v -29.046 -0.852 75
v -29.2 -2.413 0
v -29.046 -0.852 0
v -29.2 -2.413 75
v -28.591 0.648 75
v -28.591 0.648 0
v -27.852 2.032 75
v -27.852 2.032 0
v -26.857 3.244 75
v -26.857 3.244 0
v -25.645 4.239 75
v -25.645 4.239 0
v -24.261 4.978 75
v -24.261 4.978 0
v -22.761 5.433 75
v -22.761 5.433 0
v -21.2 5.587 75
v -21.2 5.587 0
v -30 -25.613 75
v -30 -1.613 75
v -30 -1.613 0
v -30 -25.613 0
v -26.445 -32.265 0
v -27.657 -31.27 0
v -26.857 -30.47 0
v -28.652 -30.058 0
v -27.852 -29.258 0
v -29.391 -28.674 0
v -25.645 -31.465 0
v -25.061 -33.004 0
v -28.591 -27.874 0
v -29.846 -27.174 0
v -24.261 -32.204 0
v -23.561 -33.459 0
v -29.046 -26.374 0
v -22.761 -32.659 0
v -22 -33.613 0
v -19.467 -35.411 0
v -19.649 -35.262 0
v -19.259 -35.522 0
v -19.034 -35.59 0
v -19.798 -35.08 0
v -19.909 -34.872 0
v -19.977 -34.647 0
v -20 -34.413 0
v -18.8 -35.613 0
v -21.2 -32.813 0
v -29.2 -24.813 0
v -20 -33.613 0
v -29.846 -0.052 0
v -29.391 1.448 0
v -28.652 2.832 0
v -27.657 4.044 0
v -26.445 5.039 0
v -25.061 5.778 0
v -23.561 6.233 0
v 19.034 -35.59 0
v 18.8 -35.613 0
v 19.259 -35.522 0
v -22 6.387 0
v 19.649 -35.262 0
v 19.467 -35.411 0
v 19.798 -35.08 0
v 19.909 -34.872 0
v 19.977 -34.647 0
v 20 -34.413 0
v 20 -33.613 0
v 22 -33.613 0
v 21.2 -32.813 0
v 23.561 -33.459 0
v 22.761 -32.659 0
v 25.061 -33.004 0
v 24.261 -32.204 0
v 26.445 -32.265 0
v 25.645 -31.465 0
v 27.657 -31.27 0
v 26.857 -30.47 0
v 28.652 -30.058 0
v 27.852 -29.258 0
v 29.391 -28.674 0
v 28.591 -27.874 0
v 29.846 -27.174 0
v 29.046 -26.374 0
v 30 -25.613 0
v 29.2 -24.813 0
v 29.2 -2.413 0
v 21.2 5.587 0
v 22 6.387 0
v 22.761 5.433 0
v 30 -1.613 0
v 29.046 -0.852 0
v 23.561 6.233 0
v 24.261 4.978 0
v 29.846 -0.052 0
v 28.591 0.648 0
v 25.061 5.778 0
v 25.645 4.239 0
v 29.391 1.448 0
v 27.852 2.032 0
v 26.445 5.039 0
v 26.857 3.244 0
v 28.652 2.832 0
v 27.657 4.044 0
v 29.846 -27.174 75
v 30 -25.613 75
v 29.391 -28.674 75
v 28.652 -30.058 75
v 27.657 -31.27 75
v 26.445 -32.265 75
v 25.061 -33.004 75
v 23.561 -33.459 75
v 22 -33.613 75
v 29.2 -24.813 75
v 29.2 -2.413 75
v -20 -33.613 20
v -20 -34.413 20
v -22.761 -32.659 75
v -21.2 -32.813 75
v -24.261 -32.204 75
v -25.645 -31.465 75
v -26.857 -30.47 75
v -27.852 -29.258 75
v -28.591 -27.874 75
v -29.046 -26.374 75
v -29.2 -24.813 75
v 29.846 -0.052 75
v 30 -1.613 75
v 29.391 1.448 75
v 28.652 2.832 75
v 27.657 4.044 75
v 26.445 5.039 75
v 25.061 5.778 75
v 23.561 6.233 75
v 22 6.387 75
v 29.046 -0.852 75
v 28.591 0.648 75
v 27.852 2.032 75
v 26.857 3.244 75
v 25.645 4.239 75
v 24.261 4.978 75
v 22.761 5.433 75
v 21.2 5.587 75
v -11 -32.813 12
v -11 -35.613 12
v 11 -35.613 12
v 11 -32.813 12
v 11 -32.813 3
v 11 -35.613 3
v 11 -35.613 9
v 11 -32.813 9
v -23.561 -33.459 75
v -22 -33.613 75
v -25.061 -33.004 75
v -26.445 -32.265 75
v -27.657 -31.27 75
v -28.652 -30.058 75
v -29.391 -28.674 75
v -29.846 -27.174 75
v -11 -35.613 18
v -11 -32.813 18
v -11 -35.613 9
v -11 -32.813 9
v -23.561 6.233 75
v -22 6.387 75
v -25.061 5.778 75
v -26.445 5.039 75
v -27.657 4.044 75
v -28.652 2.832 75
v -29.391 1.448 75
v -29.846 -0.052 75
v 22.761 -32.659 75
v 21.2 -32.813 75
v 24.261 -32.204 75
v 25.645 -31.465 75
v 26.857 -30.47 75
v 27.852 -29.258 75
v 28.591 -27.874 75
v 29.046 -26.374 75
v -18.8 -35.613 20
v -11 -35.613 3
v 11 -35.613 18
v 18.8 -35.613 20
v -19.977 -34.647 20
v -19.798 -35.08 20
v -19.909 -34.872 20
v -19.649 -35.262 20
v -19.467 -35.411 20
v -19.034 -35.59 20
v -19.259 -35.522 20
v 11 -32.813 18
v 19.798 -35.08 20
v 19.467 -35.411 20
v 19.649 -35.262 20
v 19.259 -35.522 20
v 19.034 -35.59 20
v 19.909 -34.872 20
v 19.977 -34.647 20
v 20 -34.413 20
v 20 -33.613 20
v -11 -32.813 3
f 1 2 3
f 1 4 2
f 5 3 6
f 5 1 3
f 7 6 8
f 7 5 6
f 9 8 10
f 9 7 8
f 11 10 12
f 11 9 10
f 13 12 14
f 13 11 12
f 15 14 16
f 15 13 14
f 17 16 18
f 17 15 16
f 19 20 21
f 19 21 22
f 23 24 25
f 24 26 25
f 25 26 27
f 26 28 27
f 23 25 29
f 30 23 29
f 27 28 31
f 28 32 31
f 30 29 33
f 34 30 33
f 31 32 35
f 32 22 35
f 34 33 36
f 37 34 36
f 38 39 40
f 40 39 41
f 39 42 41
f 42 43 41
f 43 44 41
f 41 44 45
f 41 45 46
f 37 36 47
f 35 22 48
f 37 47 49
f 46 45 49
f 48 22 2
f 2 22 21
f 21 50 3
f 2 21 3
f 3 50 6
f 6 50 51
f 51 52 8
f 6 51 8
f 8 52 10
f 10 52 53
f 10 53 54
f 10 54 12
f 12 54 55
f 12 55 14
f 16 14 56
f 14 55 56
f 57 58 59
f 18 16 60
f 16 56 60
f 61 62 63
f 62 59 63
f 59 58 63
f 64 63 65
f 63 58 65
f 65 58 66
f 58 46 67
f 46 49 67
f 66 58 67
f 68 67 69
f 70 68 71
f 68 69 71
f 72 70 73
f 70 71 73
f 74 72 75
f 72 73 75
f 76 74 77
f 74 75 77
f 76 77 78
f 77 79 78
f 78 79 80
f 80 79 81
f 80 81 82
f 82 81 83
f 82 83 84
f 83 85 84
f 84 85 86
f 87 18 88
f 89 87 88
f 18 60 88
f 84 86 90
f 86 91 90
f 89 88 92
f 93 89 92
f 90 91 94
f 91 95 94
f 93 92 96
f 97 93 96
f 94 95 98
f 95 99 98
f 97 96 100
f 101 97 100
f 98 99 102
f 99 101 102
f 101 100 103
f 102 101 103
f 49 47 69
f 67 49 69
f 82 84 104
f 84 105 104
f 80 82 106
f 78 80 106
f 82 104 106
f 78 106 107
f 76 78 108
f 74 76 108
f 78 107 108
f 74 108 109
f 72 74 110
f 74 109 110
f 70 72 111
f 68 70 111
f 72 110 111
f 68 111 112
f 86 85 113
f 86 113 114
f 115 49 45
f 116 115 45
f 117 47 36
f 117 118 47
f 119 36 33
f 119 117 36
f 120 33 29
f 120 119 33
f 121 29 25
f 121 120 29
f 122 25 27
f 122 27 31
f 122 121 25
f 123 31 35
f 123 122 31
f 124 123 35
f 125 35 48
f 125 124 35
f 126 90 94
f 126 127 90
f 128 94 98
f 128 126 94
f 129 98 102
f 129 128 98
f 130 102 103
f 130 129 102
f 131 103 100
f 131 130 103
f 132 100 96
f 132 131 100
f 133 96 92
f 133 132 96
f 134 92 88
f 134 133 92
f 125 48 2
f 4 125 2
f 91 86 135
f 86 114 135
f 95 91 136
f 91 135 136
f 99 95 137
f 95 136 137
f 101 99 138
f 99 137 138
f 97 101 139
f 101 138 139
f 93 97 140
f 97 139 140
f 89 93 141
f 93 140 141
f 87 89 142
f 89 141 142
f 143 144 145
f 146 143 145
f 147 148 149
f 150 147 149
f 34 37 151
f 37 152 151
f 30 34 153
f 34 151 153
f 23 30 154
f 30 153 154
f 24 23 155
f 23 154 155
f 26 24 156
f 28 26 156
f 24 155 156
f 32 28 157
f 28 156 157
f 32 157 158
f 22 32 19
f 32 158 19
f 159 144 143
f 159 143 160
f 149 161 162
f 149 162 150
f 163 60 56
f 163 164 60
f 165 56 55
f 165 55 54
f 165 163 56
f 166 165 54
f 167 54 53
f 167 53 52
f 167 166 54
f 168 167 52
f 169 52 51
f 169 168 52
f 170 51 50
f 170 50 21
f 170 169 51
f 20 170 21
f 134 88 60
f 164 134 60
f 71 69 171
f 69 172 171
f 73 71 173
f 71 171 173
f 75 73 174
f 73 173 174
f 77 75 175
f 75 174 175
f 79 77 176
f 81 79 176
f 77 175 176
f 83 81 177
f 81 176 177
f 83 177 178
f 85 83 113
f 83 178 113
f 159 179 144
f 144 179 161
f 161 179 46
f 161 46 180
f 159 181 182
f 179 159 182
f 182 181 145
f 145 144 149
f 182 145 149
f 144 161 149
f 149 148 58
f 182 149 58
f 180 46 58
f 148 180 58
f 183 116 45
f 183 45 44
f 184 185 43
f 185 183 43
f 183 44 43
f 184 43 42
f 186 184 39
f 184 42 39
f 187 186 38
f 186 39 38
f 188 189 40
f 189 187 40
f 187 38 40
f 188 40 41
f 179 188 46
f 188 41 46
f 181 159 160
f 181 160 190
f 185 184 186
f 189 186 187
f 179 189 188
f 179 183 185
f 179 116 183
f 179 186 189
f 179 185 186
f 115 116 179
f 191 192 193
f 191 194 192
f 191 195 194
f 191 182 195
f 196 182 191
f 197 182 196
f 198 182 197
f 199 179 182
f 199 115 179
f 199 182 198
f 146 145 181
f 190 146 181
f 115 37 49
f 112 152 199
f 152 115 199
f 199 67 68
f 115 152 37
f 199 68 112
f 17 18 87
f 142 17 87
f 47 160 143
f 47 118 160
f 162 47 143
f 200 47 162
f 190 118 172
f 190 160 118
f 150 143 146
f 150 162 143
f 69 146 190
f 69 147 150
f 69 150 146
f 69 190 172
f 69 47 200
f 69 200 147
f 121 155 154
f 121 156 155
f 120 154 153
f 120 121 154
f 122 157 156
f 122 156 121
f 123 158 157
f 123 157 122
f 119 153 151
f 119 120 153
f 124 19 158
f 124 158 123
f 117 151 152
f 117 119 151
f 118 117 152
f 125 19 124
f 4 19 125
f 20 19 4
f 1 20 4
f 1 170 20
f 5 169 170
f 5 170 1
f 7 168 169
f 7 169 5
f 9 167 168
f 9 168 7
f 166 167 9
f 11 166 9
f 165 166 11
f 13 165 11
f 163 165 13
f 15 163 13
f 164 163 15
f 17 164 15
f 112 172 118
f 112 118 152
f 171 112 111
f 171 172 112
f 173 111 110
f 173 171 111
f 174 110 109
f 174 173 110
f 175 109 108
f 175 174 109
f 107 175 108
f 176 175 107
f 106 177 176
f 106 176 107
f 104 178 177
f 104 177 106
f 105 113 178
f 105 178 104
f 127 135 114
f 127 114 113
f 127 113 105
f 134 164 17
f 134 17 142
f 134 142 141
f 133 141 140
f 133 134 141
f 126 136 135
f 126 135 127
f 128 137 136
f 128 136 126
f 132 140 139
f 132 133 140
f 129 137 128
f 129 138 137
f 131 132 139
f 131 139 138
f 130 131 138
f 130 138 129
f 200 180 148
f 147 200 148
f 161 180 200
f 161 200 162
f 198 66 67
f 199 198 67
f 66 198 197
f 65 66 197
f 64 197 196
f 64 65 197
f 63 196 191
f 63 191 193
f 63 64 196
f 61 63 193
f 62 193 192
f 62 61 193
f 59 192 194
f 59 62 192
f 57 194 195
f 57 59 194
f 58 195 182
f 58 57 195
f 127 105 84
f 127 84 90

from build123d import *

# Parameters (mm, degrees)
F1_DEPTH    = 20
F0_W        = 58.4
F0_H        = 38.4
F2_DEPTH    = 75
F3_T1_DEPTH = 26
F4_R        = 8
F5_W        = 22
F5_H        = 6
F6_DEPTH    = 3


# Not quite as in the source:
# - a fillet or chamfer that OpenCascade refuses, or shapes differently, is made with other operations: its cross-section is extruded or revolved along the edge and cut away or added


with BuildPart() as f1:
    # F0 (on Top) → F1 (new body)
    with BuildSketch(Plane.XY):
        Polygon((20, -35.6130205363), (20, -33.6130205363), (-20, -33.6130205363), (-20, -35.6130205363), (-10, -35.6130205363), (10, -35.6130205363), align=None)
    extrude(amount=F1_DEPTH)

    # F0 (on Top) → F2 (join)
    with BuildSketch(Plane.XY):
        Polygon((20, -33.6130205363), (30, -33.6130205363), (30, 6.3869794637), (-30, 6.3869794637), (-30, -33.6130205363), (-20, -33.6130205363), align=None)
        with Locations((0, -13.6130205363)):
            Rectangle(F0_W, F0_H, mode=Mode.SUBTRACT)
    extrude(amount=F2_DEPTH)

    # F3: fillet of radius 1.2 on 4 edges, made by hand

    # F3_s2 → F3_t1 (cut)
    with BuildSketch(Plane.XY.offset(-3)):
        with BuildLine():
            ThreePointArc((20, -34.4130205363), (19.6485281374, -35.2615486737), (18.8, -35.6130205363))
            Line((18.8, -35.6130205363), (20, -35.6130205363))
            Line((20, -35.6130205363), (20, -34.4130205363))
        make_face()
        with BuildLine():
            ThreePointArc((-20, -34.4130205363), (-19.6485281374, -35.2615486737), (-18.8, -35.6130205363))
            Line((-18.8, -35.6130205363), (-20, -35.6130205363))
            Line((-20, -35.6130205363), (-20, -34.4130205363))
        make_face()
    extrude(amount=F3_T1_DEPTH, mode=Mode.SUBTRACT)

    # F4
    f4_edges = [f1.edges().sort_by_distance(p)[0] for p in [
        (29.2, 5.586979, 37.5),
        (29.2, -32.813021, 37.5),
        (-29.2, -32.813021, 37.5),
        (-29.2, 5.586979, 37.5),
        (-30, -33.613021, 37.5),
        (-30, 6.386979, 37.5),
        (30, -33.613021, 37.5),
        (30, 6.386979, 37.5),
    ]]
    fillet(f4_edges, radius=F4_R)

    # F5 (on face) → F6 (cut)
    with BuildSketch(Plane.XZ.offset(35.6130205363)):
        with Locations((0, 15)):
            Rectangle(F5_W, F5_H)
        with Locations((0, 6)):
            Rectangle(F5_W, F5_H)
    extrude(amount=-F6_DEPTH, mode=Mode.SUBTRACT)


solid = f1.part
